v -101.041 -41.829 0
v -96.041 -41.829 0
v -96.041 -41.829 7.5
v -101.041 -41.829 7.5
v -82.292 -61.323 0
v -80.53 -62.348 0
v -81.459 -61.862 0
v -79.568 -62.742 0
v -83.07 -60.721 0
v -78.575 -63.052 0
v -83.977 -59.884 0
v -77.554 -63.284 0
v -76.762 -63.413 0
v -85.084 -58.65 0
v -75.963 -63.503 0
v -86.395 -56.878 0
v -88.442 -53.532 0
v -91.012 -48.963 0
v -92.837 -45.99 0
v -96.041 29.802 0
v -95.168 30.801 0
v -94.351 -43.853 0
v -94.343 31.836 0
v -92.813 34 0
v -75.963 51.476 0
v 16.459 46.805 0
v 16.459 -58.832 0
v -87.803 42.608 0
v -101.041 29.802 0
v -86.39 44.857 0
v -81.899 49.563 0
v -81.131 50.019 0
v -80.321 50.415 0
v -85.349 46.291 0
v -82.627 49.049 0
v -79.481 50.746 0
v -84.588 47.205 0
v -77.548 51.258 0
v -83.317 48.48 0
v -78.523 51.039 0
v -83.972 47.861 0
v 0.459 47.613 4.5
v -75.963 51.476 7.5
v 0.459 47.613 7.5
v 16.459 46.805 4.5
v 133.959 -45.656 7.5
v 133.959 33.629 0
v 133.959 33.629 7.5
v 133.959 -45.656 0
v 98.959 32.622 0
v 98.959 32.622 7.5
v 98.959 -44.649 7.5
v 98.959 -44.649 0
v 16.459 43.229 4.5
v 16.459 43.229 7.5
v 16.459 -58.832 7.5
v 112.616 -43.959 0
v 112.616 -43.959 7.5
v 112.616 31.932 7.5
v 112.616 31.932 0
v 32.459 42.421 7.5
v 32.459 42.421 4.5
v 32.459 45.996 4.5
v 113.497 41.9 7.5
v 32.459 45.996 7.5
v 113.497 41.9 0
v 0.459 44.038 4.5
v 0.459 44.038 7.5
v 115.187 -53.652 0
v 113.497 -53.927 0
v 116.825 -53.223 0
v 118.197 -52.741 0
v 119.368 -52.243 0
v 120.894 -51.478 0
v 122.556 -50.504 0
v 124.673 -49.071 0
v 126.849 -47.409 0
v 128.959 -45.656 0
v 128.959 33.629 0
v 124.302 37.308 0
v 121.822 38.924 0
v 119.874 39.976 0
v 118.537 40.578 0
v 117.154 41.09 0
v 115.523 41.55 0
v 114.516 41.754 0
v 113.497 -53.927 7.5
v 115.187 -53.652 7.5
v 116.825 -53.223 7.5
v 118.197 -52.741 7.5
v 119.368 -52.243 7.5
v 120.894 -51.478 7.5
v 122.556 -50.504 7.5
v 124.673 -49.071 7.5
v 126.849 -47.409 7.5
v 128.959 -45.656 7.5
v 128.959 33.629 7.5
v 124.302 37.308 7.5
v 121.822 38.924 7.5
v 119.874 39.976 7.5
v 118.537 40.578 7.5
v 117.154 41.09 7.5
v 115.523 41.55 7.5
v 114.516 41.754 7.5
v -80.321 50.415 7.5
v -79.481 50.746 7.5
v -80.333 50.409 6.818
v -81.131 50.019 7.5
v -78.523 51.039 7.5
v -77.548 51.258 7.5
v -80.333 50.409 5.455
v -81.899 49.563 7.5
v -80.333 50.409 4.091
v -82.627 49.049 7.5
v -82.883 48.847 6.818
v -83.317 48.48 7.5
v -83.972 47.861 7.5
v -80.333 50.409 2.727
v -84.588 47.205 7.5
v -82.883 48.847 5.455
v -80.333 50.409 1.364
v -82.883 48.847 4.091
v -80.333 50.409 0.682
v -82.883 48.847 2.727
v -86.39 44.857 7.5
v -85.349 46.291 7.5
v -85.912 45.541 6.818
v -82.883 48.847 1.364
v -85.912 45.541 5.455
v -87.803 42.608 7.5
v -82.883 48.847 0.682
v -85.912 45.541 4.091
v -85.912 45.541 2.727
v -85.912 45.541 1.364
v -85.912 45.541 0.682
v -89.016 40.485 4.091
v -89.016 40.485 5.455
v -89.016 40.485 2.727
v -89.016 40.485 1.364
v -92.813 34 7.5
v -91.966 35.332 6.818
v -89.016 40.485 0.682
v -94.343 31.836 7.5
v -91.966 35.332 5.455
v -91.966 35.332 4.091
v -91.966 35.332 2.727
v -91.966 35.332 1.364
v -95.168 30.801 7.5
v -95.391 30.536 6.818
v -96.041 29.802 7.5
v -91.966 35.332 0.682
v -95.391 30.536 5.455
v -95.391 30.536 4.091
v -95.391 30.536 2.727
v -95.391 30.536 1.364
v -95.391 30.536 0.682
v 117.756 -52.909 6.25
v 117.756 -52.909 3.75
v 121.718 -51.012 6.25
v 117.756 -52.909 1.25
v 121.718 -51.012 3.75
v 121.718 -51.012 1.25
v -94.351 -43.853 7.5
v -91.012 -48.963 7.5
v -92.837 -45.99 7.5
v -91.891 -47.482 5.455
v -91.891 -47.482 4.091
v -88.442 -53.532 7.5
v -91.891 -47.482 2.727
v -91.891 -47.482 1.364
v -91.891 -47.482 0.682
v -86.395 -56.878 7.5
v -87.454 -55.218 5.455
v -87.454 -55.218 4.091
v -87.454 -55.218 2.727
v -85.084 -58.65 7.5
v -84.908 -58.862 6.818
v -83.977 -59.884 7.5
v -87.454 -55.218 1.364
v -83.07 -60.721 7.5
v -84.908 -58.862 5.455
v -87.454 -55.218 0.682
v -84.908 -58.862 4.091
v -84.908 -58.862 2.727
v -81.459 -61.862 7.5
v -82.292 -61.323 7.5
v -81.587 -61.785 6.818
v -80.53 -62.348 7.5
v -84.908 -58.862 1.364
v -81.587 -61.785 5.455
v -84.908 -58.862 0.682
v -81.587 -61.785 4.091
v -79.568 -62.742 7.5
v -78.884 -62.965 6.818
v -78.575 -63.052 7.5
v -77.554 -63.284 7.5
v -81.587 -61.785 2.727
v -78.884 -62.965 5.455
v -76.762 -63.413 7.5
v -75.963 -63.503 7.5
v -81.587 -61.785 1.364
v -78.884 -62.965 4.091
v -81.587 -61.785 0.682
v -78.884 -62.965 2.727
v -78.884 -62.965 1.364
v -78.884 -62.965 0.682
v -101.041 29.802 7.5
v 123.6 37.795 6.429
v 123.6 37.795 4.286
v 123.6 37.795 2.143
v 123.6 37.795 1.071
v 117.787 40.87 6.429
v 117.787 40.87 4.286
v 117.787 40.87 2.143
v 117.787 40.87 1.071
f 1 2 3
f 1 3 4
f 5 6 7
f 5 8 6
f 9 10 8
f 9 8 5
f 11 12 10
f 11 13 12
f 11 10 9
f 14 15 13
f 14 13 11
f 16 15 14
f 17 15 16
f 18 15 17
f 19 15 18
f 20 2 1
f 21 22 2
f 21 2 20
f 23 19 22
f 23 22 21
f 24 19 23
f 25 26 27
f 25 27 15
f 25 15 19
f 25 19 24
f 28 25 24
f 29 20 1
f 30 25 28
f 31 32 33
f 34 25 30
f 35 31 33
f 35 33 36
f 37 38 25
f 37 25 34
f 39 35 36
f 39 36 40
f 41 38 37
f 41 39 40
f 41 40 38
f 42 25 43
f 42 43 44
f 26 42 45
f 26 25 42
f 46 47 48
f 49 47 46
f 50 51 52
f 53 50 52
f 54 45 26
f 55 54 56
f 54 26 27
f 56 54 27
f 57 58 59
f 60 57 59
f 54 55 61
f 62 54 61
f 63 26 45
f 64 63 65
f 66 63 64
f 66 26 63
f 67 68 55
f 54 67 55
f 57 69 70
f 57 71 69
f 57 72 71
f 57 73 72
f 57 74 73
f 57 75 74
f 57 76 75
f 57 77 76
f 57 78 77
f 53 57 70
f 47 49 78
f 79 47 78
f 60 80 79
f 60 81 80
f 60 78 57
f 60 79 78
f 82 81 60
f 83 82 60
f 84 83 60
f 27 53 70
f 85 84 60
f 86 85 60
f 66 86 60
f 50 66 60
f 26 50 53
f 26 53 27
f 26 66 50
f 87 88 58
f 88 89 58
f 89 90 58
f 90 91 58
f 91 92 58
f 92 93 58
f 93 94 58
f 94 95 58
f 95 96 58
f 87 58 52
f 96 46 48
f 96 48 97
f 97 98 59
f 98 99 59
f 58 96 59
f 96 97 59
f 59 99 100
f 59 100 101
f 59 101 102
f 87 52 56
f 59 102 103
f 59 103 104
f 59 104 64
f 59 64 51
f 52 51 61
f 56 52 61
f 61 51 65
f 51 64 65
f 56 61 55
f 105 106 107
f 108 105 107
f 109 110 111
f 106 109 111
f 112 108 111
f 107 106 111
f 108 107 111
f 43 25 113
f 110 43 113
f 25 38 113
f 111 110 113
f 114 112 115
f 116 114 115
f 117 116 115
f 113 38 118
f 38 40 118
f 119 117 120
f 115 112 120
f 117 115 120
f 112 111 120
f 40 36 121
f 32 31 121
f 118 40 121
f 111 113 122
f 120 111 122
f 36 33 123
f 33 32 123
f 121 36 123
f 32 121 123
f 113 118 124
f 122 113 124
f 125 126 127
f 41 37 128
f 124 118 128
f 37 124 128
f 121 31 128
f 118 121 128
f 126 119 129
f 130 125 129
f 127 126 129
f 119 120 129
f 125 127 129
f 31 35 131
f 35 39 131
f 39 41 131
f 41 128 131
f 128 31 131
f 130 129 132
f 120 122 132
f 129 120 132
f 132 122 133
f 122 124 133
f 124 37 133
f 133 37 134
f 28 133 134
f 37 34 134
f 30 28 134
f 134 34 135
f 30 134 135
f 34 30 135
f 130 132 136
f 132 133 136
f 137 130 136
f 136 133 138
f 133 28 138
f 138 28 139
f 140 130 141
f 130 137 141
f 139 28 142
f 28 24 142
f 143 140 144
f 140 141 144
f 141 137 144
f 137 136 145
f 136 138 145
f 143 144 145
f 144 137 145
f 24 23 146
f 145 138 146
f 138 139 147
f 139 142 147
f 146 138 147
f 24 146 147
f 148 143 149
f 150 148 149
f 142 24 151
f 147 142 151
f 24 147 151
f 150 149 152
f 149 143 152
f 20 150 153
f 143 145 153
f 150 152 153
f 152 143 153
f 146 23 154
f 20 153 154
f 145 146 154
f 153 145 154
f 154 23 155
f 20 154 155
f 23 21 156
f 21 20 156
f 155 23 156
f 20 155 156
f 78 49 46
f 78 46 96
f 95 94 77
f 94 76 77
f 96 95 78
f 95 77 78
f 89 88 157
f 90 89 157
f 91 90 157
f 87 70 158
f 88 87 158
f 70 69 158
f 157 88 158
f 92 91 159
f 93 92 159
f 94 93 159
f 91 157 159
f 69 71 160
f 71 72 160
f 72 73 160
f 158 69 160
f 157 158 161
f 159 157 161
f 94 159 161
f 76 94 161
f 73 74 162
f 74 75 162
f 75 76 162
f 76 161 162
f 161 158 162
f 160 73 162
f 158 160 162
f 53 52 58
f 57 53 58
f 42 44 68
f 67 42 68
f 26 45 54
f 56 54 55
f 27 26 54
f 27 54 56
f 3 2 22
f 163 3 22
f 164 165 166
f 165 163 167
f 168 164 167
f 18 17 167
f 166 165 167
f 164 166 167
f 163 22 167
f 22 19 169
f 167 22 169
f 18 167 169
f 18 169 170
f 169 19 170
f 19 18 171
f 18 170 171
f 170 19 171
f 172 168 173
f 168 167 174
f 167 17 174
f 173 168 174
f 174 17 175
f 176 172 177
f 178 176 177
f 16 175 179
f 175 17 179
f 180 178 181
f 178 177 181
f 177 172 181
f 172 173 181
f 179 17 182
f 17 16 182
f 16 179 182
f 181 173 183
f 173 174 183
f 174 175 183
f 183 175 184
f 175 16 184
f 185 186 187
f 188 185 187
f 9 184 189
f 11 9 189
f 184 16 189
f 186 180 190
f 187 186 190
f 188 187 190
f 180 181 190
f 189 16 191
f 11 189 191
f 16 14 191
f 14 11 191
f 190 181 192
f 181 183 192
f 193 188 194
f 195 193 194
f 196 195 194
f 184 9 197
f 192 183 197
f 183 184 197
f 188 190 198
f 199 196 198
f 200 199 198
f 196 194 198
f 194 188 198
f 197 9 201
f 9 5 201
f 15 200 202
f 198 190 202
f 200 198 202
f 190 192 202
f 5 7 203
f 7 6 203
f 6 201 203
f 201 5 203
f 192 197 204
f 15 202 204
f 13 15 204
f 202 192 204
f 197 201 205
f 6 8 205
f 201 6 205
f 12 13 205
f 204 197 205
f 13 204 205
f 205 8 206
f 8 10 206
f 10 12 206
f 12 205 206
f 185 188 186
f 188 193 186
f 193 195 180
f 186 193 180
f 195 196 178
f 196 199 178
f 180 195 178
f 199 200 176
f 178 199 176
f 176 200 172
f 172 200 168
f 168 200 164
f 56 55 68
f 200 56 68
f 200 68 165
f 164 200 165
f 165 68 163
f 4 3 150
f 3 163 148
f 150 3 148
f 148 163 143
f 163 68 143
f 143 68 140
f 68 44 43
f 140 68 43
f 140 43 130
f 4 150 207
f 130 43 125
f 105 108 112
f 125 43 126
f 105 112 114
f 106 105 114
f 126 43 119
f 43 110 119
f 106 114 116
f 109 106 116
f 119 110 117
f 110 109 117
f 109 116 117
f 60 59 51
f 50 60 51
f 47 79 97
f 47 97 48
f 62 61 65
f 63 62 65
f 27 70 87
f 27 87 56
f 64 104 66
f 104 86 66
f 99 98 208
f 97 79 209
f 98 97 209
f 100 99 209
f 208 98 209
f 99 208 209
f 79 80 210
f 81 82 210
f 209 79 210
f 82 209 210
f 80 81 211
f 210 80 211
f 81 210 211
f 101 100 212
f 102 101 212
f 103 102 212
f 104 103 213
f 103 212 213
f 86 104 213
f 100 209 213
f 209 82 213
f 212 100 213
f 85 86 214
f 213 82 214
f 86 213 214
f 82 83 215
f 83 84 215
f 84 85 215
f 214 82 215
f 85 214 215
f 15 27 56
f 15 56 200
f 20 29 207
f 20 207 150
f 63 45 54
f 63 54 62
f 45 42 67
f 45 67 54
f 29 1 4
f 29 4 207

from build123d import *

# Parameters (mm, degrees)
BOSS_EXTRUDE1_DEPTH    = 7.5
CUT_EXTRUDE1_DEPTH     = 149.438464419
CUT_EXTRUDE3_DEPTH     = 3
SPLIT2_SURFACE_1_BACK  = 262.728
SPLIT2_SURFACE_1_DEPTH = 525.456
SPLIT2_SURFACE_2_BACK  = 262.728
SPLIT2_SURFACE_2_DEPTH = 525.456


with BuildPart() as part:
    # Sketch1 → Boss-Extrude1 (new body)
    with BuildSketch(Plane.XY):
        with BuildLine():
            Line((128.959100066, 33.628624999), (133.959100066, 33.628624999))
            Line((133.959100066, 33.628624999), (133.959100066, -45.656116492))
            Line((133.959100066, -45.656116492), (128.959100066, -45.656116492))
            add(Edge.make_bspline(
                [(113.496599029, -53.92747215), (114.973875685, -53.76034768), (116.389465073, -53.408303088), (118.438931288, -52.658652366), (119.109837198, -52.372048444), (120.430638868, -51.735858399), (121.082915856, -51.384782434), (122.988929436, -50.267489711), (124.197203446, -49.437169981), (126.541735842, -47.677906536), (127.677620036, -46.748450374), (128.850515141, -45.74891878), (128.904828159, -45.702543351), (128.959100066, -45.656116492)],
                knots=[0, 0, 0, 0, 0.125, 0.125, 0.1875, 0.1875, 0.25, 0.25, 0.375, 0.375, 0.5, 0.5, 0.506074438, 0.506074438, 0.506074438, 0.506074438], degree=3))
            Line((113.496599029, -53.92747215), (-75.963345356, -63.503442328))
            add(Edge.make_bspline(
                [(-96.040899934, -41.829259963), (-95.798899268, -42.093160096), (-95.56197213, -42.362136183), (-94.03954966, -44.156758027), (-92.923608678, -45.792412437), (-90.858487716, -49.170948695), (-89.911065512, -50.914960796), (-88.457766632, -53.51029646), (-87.967520262, -54.371999904), (-86.940892781, -56.06392928), (-86.404912323, -56.894254814), (-85.530671439, -58.091259413), (-85.227414802, -58.482089731), (-84.588818098, -59.241614046), (-84.254184704, -59.609132259), (-83.204929916, -60.651600397), (-82.440569541, -61.270576891), (-81.160629249, -62.042718444), (-80.719255742, -62.269433113), (-79.817314106, -62.660888928), (-79.3554021, -62.826549047), (-77.940467092, -63.243286827), (-76.954208328, -63.414201398), (-75.963345356, -63.503442328)],
                knots=[0.352672192, 0.352672192, 0.352672192, 0.352672192, 0.375, 0.375, 0.5, 0.5, 0.625, 0.625, 0.6875, 0.6875, 0.75, 0.75, 0.78125, 0.78125, 0.8125, 0.8125, 0.875, 0.875, 0.90625, 0.90625, 0.9375, 0.9375, 1, 1, 1, 1], degree=3))
            Line((-96.040899934, -41.829259963), (-101.040899934, -41.829259963))
            Line((-101.040899934, -41.829259963), (-101.040899934, 29.801740739))
            Line((-101.040899934, 29.801740739), (-96.040899934, 29.801740739))
            add(Edge.make_bspline(
                [(-75.963345356, 51.475952827), (-76.969760945, 51.385311169), (-77.956664013, 51.213742336), (-79.395866789, 50.78571401), (-79.86970863, 50.613871194), (-80.796837185, 50.204577199), (-81.240590365, 49.971323111), (-82.089787414, 49.449496549), (-82.495246976, 49.160946736), (-83.271465049, 48.533739024), (-83.643007435, 48.194375714), (-84.708444042, 47.116795042), (-85.333215001, 46.343374139), (-86.491296884, 44.737676097), (-87.023827607, 43.904896882), (-88.044872363, 42.211012893), (-88.533034054, 41.34968138), (-89.982900727, 38.756279626), (-90.93240726, 37.013628654), (-92.999467157, 33.650383947), (-94.114586107, 32.031232641), (-95.60337212, 30.287705281), (-95.819744565, 30.042891916), (-96.040899934, 29.801740739)],
                knots=[0, 0, 0, 0, 0.0625, 0.0625, 0.09375, 0.09375, 0.125, 0.125, 0.15625, 0.15625, 0.1875, 0.1875, 0.25, 0.25, 0.3125, 0.3125, 0.375, 0.375, 0.5, 0.5, 0.625, 0.625, 0.645748558, 0.645748558, 0.645748558, 0.645748558], degree=3))
            Line((-75.963345356, 51.475952827), (113.496599029, 41.899982649))
            add(Edge.make_bspline(
                [(128.959100066, 33.628624999), (128.913387154, 33.667730585), (127.751192536, 34.660386778), (126.568806099, 35.629041088), (124.805320754, 36.953884089), (124.207009004, 37.38378621), (122.992052543, 38.206145046), (122.374602128, 38.599251589), (120.484333172, 39.709851881), (119.174169326, 40.359663675), (117.093195419, 41.124643977), (116.387101294, 41.341482025), (114.957490187, 41.687263925), (114.232477088, 41.816732683), (113.496599029, 41.899982649)],
                knots=[0.494878569, 0.494878569, 0.494878569, 0.494878569, 0.5, 0.625, 0.625, 0.6875, 0.6875, 0.75, 0.75, 0.875, 0.875, 0.9375, 0.9375, 1, 1, 1, 1], degree=3))
        make_face()
    extrude(amount=BOSS_EXTRUDE1_DEPTH)

    # Sketch3 → Cut-Extrude1 (cut, through all)
    with BuildSketch(Plane.XY.offset(7.5)):
        Polygon((98.959100066, 32.621993758), (98.959100066, -44.649483258), (112.616012614, -43.959214992), (112.616329261, 31.931709487), align=None)
    extrude(amount=-CUT_EXTRUDE1_DEPTH, mode=Mode.SUBTRACT)

    # Sketch5 → Cut-Extrude3 (cut)
    with BuildSketch(Plane.XY.offset(7.5)):
        Polygon((0.459100066, 47.61329436), (0.459100066, 44.038083245), (32.459100066, 42.420690995), (32.459100066, 45.99590211), align=None)
    extrude(amount=-CUT_EXTRUDE3_DEPTH, mode=Mode.SUBTRACT)


with BuildPart() as body_2:
    # Split2: the piece behind the surface
    add(part.part)
    # Split2 surface: a surface, the sketch's curves swept straight by 525.456 mm
    with BuildLine(Plane.XY.offset(7.5).offset(-SPLIT2_SURFACE_1_BACK), mode=Mode.PRIVATE) as split2_surface_1_path:
        Line((16.459100066, 62.942434119), (16.459100066, -80.716271859))
    split2_surface_1 = Shell.extrude(split2_surface_1_path.wire(), (0 * SPLIT2_SURFACE_1_DEPTH, 0 * SPLIT2_SURFACE_1_DEPTH, 1 * SPLIT2_SURFACE_1_DEPTH))
    split(bisect_by=split2_surface_1, keep=Keep.BOTTOM)


with BuildPart() as part_1:
    add(part.part)

    # Split2: split by a surface, the side it looks to stays
    # Split2 surface: a surface, the sketch's curves swept straight by 525.456 mm
    with BuildLine(Plane.XY.offset(7.5).offset(-SPLIT2_SURFACE_2_BACK), mode=Mode.PRIVATE) as split2_surface_2_path:
        Line((16.459100066, 62.942434119), (16.459100066, -80.716271859))
    split2_surface_2 = Shell.extrude(split2_surface_2_path.wire(), (0 * SPLIT2_SURFACE_2_DEPTH, 0 * SPLIT2_SURFACE_2_DEPTH, 1 * SPLIT2_SURFACE_2_DEPTH))
    split(bisect_by=split2_surface_2, keep=Keep.TOP)


solid = Compound([body_2.part, part_1.part])
